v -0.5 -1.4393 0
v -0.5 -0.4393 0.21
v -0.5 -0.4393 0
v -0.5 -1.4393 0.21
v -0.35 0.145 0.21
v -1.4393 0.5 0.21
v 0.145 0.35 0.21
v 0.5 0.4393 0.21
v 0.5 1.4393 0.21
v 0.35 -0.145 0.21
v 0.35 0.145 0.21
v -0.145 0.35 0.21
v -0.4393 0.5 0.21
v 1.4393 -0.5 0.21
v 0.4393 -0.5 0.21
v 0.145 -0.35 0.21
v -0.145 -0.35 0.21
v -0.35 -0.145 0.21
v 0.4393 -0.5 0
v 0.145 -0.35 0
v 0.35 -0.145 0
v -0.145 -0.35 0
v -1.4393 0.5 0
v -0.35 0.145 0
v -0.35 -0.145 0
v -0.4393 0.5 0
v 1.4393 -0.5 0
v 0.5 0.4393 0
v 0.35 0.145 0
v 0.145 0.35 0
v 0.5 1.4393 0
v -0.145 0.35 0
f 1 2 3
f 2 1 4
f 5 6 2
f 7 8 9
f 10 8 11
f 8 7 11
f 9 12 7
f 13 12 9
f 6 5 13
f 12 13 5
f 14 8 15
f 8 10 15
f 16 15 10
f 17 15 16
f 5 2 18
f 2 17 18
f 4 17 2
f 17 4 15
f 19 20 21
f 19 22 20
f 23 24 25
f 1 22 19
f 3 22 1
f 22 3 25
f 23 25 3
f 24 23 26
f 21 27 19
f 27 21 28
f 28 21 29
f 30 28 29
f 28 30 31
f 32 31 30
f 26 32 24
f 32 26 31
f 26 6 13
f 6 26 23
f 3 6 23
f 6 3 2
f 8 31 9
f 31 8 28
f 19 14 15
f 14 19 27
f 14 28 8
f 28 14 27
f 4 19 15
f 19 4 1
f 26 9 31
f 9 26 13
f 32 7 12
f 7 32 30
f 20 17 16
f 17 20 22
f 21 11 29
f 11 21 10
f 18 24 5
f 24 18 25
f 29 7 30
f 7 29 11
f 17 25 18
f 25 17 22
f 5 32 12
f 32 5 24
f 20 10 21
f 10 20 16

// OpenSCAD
module shuriken_quarter(){
	//A triangle
	difference(){
		cube(1);
		translate([0.5,-0.5,-0.5])rotate([0,0,45])scale([0.75,2,2])cube(1);	
	}
}
module shuriken_half(){
	//A parallelogram
	union(){
		translate([-1.5,-0.5,0])shuriken_quarter();
		rotate([0,0,180])translate([-1.5,-0.5,0])shuriken_quarter();
		translate([-0.5,-0.5,0])scale([1,1,1])cube(1);
	}
}
module full_shuriken(){
	//The plain shuriken, no aesthetic elements
	union(){
		shuriken_half();
		rotate([0,0,90])shuriken_half();
	}
}
module shuriken_hole_mould(size){
	//A mould for the hole inside of the shuriken
	union(){
		scale([1,1,3])translate([-size/2+size,-size/2,-size/2])cube(size);
		scale([1,1,3])translate([-size/2-size,-size/2,-size/2])cube(size);
		rotate([0,0,90])union(){
			scale([1,1,3])translate([-size/2+size,-size/2,-size/2])cube(size);
			scale([1,1,3])translate([-size/2-size,-size/2,-size/2])cube(size);
		}
	}
}
module shuriken_hole(size){
	//The cube for the hole in the middle of the shuriken
	difference(){
		rotate([0,0,45])scale([1,1,2])translate([-size/2,-size/2,-size/2])cube(size);
		shuriken_hole_mould(size);
	}
}
module shuriken(size){
	//The complete shuriken, with aesthetics
	difference(){
		scale([size*(1/0.7),size*(1/0.7),0.3*size])full_shuriken();
		shuriken_hole(size);
	}
}
shuriken(0.7);
